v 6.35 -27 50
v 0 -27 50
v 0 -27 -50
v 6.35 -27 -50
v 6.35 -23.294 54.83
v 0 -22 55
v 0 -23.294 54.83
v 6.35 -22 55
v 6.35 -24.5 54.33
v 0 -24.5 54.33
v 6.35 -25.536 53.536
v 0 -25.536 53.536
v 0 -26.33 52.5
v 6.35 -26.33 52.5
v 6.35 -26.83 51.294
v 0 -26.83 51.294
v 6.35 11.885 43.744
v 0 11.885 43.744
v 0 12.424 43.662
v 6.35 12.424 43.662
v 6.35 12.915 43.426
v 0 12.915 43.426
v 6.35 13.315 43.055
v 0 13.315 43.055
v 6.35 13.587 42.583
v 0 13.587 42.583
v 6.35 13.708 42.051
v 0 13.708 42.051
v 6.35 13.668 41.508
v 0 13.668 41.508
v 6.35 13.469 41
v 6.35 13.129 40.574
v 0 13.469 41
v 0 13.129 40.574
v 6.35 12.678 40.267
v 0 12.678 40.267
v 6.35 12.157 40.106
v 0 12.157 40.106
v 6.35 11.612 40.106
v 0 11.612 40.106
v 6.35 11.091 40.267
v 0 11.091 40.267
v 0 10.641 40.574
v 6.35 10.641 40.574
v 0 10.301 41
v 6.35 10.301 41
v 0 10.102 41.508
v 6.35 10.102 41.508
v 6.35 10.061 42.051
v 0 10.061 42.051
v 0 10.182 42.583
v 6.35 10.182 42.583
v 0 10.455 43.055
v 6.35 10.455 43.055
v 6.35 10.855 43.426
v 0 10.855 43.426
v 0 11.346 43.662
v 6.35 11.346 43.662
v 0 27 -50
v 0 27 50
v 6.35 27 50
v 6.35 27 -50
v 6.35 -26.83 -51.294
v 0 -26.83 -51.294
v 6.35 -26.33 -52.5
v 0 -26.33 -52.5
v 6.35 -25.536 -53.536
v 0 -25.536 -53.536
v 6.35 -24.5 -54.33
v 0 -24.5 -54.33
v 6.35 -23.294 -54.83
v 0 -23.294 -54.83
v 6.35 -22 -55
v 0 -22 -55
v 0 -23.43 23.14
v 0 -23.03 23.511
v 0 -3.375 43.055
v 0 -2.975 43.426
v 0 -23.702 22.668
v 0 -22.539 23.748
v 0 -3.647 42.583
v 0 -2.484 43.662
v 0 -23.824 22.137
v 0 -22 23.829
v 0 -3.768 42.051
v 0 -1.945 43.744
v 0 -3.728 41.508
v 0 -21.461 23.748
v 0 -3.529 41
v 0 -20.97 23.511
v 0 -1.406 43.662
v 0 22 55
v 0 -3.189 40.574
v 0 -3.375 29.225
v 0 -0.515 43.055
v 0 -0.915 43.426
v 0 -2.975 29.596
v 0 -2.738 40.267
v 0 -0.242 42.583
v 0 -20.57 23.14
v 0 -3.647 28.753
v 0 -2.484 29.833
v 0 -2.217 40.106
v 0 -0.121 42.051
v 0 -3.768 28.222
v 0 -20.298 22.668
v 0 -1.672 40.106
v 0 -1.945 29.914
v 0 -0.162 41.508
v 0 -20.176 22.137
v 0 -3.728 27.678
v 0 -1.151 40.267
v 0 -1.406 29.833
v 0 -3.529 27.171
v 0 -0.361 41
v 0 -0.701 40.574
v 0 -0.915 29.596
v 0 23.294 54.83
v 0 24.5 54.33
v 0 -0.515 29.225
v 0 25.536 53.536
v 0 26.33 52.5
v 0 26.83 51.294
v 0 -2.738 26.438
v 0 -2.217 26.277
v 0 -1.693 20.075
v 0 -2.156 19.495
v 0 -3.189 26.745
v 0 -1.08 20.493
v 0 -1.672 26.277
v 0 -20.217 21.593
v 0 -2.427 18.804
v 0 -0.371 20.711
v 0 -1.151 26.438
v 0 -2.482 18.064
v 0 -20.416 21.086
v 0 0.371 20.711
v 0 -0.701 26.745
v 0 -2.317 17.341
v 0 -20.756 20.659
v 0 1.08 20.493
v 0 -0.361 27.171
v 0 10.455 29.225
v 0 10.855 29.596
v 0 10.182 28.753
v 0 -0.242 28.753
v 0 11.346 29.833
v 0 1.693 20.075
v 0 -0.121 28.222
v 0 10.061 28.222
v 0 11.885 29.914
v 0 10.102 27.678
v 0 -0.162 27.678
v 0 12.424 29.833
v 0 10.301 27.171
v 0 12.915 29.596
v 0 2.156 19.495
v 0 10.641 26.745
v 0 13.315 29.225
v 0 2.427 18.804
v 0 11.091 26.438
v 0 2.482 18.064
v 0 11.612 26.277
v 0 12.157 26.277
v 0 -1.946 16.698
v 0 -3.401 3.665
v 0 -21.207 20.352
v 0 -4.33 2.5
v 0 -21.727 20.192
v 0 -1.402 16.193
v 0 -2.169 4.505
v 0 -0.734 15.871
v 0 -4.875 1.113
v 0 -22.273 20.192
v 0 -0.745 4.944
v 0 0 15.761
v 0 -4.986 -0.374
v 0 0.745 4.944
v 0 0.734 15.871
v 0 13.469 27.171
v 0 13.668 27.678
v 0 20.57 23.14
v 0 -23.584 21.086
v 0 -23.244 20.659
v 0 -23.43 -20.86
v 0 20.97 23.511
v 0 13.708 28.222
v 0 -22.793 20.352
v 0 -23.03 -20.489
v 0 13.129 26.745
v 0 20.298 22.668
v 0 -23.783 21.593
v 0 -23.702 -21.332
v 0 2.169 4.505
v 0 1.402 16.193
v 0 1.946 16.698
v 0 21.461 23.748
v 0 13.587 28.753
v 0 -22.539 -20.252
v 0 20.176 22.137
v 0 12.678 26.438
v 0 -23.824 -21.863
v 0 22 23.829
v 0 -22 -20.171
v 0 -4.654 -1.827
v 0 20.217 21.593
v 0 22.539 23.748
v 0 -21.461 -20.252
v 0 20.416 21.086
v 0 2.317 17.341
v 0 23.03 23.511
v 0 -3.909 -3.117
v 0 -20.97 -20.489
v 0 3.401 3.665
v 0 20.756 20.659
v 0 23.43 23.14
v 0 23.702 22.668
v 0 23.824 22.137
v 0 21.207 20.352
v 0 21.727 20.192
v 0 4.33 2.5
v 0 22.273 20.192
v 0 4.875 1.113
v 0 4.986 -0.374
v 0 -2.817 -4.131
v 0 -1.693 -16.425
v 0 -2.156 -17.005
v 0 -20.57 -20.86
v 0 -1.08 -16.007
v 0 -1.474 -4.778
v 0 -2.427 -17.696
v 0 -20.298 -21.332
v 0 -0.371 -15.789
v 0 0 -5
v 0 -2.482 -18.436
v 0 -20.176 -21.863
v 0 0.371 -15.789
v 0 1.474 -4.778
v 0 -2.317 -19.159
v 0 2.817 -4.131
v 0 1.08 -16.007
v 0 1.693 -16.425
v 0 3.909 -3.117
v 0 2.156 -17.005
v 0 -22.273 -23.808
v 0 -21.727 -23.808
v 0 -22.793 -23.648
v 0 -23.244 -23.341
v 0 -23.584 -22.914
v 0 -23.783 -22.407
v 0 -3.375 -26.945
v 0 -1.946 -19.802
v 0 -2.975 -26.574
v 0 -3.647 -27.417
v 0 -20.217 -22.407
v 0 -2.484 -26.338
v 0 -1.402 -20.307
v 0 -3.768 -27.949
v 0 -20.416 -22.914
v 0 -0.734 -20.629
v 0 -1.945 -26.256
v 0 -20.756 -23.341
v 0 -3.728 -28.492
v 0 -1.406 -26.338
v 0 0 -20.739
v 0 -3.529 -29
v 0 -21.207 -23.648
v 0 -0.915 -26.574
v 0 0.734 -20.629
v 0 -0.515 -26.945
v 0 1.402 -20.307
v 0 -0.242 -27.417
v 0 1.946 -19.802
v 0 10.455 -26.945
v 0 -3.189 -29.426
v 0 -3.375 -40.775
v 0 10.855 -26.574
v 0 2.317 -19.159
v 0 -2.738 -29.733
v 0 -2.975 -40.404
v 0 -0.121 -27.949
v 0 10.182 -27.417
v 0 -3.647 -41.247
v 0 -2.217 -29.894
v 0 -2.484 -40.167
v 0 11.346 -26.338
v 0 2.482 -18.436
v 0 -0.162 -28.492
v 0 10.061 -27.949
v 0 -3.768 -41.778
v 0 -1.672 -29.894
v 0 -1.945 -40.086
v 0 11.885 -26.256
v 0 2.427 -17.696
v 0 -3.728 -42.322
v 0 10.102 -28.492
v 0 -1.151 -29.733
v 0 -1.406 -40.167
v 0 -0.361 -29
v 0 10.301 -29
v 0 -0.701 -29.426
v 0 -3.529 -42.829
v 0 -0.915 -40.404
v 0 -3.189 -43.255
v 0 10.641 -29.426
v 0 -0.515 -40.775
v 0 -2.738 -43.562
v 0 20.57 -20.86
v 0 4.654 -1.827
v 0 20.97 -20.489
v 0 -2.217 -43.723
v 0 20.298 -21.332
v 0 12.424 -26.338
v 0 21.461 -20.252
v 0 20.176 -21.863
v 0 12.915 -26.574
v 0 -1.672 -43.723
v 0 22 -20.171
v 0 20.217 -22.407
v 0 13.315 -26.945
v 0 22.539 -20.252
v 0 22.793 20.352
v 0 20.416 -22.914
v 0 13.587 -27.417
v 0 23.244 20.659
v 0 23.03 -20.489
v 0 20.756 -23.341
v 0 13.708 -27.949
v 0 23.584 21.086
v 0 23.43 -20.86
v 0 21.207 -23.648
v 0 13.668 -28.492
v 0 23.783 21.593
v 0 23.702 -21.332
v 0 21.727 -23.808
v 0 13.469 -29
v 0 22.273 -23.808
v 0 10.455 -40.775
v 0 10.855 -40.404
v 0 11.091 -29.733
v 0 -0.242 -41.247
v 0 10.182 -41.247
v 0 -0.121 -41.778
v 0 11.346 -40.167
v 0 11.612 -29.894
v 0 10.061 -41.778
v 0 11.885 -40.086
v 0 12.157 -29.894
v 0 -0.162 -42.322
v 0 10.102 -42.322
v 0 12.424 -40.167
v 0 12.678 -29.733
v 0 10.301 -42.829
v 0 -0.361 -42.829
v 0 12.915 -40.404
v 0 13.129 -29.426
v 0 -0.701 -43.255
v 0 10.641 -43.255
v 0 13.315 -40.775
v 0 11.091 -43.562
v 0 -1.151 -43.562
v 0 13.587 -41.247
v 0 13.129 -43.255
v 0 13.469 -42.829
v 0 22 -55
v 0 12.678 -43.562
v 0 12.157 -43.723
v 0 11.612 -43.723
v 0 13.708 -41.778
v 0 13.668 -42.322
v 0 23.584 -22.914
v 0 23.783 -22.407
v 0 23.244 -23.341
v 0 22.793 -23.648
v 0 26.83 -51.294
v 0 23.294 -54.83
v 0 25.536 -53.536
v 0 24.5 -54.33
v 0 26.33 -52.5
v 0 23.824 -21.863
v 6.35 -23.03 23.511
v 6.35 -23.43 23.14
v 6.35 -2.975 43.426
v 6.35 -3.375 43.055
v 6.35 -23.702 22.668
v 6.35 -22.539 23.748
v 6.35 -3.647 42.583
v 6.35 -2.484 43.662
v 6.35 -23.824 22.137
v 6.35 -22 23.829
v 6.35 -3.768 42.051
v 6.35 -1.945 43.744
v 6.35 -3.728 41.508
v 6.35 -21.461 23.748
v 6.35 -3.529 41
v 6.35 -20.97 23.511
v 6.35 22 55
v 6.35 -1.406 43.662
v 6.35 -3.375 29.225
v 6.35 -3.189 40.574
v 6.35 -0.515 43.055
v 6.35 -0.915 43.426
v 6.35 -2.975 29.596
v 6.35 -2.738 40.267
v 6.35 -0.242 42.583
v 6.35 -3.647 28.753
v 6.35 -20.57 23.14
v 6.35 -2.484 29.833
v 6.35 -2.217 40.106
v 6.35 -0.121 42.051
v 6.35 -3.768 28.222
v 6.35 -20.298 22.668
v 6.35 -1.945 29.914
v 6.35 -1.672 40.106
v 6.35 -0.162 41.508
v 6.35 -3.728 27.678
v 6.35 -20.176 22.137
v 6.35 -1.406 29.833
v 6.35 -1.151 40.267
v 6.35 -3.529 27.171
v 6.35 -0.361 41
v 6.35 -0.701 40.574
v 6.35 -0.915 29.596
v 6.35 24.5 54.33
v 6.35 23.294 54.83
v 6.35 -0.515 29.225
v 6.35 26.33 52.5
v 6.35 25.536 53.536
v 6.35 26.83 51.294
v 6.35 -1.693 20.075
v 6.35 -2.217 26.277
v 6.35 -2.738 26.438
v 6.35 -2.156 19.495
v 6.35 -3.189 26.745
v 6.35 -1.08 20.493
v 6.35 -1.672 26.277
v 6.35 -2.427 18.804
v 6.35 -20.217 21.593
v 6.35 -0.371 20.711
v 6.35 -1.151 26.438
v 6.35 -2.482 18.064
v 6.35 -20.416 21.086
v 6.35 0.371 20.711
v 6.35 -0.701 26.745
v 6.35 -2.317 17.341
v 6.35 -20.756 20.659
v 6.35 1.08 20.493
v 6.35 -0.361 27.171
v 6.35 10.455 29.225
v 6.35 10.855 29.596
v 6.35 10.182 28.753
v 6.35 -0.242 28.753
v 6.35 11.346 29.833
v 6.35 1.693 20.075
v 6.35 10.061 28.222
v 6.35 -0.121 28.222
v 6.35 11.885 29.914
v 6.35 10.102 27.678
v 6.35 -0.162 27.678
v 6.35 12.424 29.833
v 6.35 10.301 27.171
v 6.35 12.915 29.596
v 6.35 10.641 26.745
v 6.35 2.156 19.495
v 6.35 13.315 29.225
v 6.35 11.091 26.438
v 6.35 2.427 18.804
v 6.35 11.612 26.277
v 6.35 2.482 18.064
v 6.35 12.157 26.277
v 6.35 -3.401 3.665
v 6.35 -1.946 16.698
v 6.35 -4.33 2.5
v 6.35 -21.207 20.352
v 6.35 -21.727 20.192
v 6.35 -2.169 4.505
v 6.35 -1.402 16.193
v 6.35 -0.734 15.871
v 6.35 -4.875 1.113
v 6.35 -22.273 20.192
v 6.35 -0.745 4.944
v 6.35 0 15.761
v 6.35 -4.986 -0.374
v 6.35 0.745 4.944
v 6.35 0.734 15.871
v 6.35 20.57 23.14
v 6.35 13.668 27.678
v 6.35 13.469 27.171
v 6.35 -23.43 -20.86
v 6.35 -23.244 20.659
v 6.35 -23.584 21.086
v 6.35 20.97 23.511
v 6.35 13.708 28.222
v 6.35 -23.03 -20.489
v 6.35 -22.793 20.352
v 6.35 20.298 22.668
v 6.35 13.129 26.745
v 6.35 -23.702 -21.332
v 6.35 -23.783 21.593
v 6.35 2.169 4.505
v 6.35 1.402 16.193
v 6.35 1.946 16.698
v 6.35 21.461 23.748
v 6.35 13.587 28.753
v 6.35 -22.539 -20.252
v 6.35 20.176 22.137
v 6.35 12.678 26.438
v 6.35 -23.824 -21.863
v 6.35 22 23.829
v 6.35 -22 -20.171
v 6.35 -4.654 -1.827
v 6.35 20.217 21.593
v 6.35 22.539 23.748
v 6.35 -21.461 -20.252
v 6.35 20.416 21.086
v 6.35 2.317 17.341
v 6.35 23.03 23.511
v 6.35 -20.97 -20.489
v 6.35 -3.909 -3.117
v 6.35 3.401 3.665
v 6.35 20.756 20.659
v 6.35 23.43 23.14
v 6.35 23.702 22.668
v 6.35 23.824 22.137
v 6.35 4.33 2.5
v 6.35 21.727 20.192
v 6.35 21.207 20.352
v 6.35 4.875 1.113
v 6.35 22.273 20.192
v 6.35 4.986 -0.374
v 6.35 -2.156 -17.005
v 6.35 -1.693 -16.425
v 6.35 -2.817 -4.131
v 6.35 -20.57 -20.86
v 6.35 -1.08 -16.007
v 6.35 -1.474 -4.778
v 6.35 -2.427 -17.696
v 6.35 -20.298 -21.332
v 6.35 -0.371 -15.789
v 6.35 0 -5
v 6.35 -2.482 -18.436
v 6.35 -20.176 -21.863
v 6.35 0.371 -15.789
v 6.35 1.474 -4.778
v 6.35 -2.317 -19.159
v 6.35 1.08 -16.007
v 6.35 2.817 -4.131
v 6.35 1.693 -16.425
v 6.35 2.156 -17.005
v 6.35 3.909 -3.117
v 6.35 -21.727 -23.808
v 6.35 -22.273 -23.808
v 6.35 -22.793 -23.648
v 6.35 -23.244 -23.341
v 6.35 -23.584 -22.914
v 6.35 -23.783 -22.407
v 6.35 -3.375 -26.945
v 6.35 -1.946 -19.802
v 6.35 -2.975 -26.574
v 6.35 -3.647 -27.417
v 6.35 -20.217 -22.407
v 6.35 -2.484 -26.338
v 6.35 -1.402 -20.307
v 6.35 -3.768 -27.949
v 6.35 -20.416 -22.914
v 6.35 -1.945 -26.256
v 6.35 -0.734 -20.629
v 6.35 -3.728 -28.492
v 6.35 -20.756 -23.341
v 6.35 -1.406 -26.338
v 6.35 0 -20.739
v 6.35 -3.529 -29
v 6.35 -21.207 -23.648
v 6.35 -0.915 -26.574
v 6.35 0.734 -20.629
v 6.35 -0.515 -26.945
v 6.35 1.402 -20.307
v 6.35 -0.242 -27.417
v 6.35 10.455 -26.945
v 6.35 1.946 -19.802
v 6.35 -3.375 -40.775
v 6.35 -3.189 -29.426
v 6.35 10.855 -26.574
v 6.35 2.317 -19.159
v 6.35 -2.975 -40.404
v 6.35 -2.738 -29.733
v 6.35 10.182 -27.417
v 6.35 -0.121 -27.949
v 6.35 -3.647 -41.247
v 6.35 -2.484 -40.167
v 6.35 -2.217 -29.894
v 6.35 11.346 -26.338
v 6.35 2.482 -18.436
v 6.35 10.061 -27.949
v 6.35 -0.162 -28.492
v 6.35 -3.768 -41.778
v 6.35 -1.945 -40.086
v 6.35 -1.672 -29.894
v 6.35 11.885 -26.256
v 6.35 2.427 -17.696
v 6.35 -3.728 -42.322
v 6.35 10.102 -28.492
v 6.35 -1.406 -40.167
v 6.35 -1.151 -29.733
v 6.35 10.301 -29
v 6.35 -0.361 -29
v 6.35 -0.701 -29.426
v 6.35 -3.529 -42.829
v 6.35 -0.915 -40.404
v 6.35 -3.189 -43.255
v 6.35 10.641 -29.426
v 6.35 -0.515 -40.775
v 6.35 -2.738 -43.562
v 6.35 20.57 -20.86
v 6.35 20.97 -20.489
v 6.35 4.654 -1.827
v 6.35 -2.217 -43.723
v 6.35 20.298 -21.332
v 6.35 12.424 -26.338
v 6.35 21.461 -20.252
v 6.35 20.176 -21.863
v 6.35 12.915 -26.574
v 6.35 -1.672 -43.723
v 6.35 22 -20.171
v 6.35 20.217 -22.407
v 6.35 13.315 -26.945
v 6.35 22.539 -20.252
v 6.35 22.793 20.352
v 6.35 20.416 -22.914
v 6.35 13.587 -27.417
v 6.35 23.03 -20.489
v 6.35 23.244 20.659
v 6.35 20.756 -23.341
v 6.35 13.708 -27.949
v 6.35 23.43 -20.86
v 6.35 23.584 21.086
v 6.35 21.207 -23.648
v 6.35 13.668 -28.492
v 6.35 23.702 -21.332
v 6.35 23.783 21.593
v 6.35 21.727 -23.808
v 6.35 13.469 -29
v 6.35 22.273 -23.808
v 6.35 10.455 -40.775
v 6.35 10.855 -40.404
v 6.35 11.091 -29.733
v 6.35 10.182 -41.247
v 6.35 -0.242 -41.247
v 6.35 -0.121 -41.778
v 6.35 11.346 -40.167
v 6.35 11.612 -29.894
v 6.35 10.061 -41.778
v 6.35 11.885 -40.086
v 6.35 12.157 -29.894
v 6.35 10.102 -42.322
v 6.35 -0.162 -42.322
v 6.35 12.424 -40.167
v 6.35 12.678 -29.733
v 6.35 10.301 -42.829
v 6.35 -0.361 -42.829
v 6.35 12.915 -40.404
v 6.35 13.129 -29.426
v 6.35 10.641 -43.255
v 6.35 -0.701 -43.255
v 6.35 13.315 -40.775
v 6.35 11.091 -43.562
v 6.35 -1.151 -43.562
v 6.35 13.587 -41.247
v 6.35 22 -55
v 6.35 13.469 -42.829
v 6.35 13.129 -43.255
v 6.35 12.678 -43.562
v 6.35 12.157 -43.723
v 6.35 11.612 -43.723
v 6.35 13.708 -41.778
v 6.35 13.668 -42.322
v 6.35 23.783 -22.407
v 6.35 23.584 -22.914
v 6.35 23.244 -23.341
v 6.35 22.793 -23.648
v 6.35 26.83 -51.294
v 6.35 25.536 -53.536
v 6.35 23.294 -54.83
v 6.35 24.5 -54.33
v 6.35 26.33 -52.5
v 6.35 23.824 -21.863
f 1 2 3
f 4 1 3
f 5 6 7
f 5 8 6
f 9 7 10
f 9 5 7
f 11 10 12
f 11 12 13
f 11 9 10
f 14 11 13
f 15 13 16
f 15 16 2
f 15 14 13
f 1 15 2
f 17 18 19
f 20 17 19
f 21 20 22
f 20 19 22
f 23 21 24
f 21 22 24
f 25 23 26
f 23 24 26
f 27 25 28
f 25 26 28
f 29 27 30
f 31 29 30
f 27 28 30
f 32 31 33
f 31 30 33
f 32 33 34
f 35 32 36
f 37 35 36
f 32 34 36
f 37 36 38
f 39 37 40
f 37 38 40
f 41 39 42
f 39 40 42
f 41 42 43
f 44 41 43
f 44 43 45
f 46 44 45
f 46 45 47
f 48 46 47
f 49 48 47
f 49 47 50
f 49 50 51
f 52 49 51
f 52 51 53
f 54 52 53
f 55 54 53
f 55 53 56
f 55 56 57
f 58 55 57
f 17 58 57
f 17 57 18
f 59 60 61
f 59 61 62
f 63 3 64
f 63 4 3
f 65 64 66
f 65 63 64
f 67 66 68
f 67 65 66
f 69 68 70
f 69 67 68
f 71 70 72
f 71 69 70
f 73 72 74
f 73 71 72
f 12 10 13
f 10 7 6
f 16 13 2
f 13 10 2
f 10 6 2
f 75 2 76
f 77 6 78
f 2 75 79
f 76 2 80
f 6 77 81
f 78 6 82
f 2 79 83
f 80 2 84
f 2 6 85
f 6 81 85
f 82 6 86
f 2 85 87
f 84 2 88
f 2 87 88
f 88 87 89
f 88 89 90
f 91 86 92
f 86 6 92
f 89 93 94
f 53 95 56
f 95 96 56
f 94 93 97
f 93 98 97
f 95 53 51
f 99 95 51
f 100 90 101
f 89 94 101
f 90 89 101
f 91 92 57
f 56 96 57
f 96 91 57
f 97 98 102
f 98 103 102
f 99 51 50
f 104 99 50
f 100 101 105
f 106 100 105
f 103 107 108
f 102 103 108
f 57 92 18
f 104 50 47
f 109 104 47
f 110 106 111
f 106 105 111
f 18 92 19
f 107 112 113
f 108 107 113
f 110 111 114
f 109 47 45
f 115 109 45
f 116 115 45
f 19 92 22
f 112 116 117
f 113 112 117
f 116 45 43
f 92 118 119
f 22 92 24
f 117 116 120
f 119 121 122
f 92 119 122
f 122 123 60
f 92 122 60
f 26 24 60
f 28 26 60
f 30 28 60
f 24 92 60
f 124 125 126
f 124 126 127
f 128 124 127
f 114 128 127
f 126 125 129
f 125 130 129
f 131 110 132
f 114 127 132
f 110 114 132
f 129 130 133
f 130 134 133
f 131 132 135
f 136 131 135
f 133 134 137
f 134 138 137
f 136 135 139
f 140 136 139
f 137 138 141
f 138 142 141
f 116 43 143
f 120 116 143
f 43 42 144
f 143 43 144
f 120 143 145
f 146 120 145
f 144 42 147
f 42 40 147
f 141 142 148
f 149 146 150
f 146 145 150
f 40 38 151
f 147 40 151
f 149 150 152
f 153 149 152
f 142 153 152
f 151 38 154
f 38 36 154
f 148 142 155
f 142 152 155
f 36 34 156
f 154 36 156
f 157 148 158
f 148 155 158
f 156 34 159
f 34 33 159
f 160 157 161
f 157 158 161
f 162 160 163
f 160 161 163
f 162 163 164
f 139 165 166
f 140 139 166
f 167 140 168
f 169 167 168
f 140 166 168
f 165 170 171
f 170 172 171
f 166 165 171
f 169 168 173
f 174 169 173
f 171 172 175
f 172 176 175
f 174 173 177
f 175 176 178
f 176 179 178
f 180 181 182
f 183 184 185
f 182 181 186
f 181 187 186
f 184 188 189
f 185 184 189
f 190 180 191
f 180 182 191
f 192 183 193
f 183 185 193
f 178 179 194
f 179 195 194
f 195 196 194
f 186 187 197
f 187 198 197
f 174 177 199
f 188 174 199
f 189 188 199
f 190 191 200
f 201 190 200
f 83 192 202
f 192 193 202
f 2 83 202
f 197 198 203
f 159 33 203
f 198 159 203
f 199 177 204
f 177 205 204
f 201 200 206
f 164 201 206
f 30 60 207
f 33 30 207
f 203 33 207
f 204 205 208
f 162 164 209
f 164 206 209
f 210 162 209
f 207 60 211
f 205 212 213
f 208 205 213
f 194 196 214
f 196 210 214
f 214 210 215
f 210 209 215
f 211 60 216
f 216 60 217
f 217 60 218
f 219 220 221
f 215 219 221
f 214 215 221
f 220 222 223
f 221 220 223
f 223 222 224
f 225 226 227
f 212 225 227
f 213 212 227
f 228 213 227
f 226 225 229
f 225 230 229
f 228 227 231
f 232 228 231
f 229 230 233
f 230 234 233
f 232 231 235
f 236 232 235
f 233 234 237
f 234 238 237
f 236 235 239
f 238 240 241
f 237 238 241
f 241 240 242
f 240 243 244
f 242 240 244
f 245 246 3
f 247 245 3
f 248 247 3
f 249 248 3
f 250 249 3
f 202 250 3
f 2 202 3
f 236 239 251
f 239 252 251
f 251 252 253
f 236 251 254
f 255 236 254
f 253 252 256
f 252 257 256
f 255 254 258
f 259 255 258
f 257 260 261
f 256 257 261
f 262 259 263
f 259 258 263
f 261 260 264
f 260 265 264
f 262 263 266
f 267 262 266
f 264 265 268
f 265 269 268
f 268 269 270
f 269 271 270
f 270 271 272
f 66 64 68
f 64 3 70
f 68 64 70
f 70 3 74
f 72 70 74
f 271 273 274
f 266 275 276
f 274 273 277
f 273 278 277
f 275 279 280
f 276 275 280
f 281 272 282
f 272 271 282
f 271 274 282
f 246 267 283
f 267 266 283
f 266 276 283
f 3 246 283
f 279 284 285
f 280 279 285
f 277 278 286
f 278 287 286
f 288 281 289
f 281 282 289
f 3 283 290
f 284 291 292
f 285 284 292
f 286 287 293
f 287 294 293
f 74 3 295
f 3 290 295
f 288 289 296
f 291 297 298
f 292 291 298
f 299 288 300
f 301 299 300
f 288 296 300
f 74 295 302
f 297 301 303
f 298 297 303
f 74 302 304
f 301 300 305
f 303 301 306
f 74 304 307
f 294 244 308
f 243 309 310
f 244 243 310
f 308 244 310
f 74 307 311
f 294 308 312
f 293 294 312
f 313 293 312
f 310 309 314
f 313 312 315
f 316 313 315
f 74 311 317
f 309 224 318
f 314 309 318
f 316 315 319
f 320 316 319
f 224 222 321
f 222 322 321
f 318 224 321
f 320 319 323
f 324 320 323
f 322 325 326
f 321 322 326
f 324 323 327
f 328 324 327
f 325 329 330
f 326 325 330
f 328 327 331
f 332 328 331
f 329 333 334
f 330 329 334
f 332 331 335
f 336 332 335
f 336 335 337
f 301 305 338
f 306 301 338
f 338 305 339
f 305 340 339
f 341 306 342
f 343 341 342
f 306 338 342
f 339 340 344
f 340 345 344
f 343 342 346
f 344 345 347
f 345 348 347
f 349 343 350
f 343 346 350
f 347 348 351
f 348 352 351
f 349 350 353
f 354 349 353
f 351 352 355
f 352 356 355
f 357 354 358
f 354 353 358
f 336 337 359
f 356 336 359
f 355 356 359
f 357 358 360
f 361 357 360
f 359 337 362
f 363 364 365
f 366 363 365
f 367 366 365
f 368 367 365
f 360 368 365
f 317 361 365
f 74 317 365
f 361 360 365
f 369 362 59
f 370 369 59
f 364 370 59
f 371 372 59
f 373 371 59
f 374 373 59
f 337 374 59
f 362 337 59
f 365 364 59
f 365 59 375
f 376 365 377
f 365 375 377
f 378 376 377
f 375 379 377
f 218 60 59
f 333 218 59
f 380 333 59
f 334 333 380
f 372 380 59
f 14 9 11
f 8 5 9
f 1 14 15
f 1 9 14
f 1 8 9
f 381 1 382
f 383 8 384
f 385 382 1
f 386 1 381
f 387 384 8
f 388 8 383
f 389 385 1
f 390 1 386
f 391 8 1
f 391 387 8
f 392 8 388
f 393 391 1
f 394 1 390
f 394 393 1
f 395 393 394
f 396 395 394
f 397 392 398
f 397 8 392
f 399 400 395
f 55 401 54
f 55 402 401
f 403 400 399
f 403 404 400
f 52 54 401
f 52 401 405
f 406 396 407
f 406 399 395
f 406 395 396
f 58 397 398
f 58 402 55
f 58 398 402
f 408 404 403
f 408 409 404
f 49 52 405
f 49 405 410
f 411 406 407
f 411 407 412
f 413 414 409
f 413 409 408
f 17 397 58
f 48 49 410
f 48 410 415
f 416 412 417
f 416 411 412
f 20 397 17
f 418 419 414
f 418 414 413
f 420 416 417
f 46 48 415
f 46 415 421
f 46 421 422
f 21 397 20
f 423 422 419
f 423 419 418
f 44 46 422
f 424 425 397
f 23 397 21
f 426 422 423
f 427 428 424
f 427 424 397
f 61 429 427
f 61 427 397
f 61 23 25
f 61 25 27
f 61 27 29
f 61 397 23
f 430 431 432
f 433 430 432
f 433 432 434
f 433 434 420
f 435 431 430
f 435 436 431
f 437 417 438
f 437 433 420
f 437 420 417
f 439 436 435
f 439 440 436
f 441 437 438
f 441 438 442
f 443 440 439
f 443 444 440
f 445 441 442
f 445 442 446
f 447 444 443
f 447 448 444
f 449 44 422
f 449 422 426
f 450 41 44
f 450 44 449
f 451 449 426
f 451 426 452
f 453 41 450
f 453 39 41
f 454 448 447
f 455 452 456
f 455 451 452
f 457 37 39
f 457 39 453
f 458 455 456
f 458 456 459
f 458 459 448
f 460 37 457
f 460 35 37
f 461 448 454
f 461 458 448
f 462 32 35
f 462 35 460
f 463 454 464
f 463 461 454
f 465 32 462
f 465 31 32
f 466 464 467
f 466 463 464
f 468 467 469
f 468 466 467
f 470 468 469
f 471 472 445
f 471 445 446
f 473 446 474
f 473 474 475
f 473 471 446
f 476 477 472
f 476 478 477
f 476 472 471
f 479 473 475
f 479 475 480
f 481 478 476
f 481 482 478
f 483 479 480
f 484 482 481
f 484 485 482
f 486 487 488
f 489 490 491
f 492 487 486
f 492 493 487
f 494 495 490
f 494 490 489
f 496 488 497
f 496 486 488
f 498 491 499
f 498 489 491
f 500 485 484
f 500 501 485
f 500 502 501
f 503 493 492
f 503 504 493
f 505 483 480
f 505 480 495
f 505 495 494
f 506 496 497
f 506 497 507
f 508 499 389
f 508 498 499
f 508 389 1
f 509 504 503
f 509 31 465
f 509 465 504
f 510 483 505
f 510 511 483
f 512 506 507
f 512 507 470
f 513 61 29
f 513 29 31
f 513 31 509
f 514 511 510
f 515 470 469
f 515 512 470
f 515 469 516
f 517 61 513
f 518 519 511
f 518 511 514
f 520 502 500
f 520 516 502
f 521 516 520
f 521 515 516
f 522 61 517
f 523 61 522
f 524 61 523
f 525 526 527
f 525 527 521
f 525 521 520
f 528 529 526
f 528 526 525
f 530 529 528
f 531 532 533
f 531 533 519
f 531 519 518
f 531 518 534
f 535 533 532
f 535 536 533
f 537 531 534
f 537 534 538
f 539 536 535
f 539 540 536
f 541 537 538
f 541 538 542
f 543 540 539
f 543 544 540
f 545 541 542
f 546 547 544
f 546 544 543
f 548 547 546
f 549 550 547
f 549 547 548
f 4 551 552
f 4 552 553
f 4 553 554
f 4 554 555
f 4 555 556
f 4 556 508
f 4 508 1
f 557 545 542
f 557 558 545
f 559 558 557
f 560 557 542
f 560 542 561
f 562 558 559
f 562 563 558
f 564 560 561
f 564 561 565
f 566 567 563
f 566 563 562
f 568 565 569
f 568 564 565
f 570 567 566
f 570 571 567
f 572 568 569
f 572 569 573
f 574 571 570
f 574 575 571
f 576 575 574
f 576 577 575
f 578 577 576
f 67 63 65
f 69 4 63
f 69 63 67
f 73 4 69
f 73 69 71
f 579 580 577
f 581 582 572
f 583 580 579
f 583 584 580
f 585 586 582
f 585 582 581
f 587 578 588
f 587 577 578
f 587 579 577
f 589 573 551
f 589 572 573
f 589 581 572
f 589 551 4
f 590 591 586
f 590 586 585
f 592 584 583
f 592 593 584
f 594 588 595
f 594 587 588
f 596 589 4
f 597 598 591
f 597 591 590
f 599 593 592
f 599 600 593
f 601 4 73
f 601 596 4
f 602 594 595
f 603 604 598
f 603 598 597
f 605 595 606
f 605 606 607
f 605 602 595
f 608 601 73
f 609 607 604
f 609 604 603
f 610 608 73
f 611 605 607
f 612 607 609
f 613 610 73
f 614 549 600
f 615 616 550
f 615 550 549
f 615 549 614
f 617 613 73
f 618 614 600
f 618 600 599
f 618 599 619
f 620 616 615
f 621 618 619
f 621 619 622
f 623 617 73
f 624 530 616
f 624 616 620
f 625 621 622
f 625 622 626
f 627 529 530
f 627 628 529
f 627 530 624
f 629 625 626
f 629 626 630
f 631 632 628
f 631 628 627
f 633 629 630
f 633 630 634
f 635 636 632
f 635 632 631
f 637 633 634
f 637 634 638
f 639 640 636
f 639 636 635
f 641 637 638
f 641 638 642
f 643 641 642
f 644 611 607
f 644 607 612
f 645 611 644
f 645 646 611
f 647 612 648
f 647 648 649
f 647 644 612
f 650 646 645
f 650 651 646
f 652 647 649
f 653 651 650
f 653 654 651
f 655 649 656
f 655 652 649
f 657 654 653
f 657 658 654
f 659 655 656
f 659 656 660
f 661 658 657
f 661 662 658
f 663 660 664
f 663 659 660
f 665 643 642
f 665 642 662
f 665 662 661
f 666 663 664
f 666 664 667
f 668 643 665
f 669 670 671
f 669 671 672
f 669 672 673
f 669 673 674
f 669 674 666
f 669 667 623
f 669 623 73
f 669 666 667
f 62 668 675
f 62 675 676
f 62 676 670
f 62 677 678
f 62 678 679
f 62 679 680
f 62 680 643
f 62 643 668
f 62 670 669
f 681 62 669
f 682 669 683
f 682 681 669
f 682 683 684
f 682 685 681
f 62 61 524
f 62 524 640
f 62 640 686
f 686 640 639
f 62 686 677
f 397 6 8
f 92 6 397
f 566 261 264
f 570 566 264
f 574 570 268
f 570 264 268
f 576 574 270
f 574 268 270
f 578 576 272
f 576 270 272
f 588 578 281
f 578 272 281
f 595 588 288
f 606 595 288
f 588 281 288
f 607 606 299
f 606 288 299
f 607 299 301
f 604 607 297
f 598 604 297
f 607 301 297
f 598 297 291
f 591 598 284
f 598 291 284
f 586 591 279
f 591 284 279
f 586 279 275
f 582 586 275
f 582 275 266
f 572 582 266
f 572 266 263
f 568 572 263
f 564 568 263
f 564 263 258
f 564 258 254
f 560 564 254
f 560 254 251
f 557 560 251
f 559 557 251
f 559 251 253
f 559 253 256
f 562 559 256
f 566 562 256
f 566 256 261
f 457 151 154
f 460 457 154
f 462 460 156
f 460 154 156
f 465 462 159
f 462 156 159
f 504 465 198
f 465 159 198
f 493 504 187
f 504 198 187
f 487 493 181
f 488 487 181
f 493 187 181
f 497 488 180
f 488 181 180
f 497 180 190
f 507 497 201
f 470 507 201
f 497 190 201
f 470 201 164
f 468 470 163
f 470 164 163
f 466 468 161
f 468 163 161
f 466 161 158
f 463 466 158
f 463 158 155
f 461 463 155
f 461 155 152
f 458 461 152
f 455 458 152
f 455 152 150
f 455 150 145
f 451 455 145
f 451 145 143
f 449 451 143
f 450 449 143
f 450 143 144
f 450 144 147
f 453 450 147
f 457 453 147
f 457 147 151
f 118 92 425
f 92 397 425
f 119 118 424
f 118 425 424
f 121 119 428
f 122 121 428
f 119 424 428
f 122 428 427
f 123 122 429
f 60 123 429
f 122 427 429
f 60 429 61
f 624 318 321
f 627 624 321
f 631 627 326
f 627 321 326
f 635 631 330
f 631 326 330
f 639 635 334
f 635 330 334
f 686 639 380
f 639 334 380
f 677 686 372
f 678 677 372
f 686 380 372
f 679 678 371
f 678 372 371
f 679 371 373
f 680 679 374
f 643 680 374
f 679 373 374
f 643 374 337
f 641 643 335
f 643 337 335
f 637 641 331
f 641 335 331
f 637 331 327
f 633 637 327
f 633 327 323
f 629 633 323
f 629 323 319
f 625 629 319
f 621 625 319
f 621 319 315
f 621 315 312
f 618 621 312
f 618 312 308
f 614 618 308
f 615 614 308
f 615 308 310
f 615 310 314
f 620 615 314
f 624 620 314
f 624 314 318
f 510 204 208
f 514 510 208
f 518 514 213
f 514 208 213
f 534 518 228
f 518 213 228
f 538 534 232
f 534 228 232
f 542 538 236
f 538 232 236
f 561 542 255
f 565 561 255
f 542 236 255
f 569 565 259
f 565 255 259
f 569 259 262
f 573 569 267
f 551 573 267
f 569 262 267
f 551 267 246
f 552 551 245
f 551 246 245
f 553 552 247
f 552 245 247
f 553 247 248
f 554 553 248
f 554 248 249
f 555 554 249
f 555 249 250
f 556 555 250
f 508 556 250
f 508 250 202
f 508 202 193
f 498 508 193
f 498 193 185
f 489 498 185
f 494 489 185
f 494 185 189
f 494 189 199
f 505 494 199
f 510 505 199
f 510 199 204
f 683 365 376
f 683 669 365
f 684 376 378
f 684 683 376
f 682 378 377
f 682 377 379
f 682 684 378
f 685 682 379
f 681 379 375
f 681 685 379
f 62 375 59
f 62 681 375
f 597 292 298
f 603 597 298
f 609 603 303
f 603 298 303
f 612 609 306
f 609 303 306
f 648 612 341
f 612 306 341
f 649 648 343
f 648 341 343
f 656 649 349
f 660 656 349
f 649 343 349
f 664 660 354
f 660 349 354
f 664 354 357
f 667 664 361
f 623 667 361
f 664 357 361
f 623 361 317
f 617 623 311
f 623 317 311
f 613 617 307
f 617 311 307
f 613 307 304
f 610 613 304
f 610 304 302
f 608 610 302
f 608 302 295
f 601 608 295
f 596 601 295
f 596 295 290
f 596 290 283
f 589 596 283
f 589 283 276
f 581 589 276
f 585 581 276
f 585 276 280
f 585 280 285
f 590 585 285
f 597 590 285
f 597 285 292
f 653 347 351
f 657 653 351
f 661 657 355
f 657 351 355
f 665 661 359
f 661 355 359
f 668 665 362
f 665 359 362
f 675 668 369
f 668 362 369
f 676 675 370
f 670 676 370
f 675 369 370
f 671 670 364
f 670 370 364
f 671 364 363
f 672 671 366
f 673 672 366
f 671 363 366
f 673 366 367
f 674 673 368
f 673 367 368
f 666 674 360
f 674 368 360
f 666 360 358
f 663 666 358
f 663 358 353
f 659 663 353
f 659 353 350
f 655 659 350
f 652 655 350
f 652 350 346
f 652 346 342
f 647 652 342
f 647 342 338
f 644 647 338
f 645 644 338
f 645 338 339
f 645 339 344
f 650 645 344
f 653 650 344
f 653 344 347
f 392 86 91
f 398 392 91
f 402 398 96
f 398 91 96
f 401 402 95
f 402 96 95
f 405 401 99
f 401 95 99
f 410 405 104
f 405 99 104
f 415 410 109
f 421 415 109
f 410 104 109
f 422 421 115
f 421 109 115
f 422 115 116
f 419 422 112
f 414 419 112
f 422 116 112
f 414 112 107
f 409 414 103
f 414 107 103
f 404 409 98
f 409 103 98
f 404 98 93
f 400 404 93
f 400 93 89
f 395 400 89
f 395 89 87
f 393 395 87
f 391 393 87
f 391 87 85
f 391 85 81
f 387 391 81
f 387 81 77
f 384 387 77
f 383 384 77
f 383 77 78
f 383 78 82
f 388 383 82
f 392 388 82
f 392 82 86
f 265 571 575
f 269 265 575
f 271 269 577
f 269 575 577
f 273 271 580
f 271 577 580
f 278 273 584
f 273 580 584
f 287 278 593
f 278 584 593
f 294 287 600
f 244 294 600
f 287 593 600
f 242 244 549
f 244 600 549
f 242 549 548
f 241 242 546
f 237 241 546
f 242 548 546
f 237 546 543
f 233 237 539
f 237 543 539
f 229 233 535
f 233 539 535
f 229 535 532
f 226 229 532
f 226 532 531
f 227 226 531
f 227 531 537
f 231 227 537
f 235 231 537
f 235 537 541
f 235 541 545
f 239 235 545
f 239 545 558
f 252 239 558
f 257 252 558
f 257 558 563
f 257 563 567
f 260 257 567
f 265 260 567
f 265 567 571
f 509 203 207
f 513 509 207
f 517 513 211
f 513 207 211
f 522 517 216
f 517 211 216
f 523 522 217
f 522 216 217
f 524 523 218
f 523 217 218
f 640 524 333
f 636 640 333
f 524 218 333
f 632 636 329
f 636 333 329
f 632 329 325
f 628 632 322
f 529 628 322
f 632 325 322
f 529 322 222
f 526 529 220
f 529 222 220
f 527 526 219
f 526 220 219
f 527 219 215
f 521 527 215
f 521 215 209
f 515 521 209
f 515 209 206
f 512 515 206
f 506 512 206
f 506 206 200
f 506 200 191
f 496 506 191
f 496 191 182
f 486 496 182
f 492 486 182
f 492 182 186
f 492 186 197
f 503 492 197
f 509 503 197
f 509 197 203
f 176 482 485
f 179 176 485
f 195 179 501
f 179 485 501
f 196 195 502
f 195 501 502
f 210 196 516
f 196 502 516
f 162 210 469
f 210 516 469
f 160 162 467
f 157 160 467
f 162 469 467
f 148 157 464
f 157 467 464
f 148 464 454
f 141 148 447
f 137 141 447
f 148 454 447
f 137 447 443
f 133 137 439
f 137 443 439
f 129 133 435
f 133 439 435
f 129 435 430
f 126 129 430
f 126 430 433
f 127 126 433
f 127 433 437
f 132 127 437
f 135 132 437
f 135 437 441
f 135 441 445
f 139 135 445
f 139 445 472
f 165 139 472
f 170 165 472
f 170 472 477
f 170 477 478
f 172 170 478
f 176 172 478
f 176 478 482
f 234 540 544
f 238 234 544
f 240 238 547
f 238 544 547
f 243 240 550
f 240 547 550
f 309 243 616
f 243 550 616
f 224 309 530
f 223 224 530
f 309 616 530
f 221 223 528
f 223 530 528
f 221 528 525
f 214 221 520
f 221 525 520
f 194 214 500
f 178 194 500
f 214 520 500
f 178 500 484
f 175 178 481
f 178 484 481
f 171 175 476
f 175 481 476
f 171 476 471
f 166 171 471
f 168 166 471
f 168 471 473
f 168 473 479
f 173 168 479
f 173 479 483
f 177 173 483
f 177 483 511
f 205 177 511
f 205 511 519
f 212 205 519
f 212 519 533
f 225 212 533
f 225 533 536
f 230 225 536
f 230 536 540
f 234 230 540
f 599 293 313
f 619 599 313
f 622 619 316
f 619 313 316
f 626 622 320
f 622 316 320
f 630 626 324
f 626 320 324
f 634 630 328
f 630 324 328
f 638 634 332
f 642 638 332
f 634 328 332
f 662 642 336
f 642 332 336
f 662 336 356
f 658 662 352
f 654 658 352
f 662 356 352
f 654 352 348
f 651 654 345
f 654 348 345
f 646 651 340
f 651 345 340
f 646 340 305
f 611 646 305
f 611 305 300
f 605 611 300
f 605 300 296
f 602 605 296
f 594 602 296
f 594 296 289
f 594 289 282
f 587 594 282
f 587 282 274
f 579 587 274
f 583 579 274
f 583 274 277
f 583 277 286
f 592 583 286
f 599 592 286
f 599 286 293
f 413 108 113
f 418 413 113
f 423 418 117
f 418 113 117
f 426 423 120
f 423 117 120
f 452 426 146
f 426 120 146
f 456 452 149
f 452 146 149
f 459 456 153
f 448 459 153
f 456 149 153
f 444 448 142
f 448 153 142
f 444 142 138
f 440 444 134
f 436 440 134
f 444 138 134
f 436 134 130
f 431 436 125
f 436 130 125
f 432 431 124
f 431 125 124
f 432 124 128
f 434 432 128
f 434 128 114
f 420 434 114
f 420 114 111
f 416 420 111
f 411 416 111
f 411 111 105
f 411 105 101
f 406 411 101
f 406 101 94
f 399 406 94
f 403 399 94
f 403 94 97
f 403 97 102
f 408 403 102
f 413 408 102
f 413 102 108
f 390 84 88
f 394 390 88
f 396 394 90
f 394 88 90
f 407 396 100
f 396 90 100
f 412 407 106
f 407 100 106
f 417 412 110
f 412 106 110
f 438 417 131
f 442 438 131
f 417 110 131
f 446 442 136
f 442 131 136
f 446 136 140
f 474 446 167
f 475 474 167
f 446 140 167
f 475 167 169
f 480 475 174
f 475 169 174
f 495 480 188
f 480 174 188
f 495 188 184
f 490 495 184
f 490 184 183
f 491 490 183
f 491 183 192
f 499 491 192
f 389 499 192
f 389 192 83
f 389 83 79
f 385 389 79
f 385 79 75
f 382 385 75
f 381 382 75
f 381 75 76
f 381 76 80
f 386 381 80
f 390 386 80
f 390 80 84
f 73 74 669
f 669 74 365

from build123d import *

# Parameters (mm, degrees)
SKETCH1_W              = 110
SKETCH1_H              = 54
BOSS_EXTRUDE1_DEPTH    = 6.35
FILLET1_R              = 5
F_6_CLEARANCE_HOLE1_D  = 3.6576
SKETCH5_R              = 5
CUT_EXTRUDE1_DEPTH     = 7.35
F_6_CLEARANCE_HOLE2_D  = 3.6576
F_10_CLEARANCE_HOLE1_D = 4.9784


with BuildPart() as part:
    # Sketch1 → Boss-Extrude1 (new body)
    with BuildSketch(Plane(origin=(0, 0, 0), x_dir=(0, 0, -1), z_dir=(1, 0, 0))):
        Rectangle(SKETCH1_W, SKETCH1_H)
    extrude(amount=BOSS_EXTRUDE1_DEPTH)

    # Fillet1
    fillet1_edges = [part.edges().sort_by_distance(p)[0] for p in [
        (3.175, -27, -55),
        (3.175, -27, 55),
        (3.175, 27, 55),
        (3.175, 27, -55),
    ]]
    fillet(fillet1_edges, radius=FILLET1_R)

    # #6 Clearance Hole1 (through all)
    with Locations(Plane(origin=(6.35, 0, 0), x_dir=(0, 0, -1), z_dir=(1, 0, 0))):
        with Locations((-22, 22), (22, 22), (22, -22), (-22, -22)):
            Hole(F_6_CLEARANCE_HOLE1_D / 2)

    # Sketch5 → Cut-Extrude1 (cut, through all)
    with BuildSketch(Plane(origin=(6.35, 0, 0), x_dir=(0, 0, -1), z_dir=(1, 0, 0))):
        Circle(SKETCH5_R)
    extrude(amount=-CUT_EXTRUDE1_DEPTH, mode=Mode.SUBTRACT)

    # #6 Clearance Hole2 (through all)
    with Locations(Plane(origin=(6.35, 0, 0), x_dir=(0, 0, -1), z_dir=(1, 0, 0))):
        with Locations((-41.914797213, 11.884797213), (-28.085202787, 11.884797213), (-28.085202787, -1.944797213), (-41.914797213, -1.944797213), (28.085202787, 11.884797213), (28.085202787, -1.944797213), (41.914797213, -1.944797213), (41.914797213, 11.884797213)):
            Hole(F_6_CLEARANCE_HOLE2_D / 2)

    # #10 Clearance Hole1 (through all)
    with Locations(Plane.ZY):
        with Locations((18.25, 0), (-18.25, 0)):
            Hole(F_10_CLEARANCE_HOLE1_D / 2)


solid = part.part
